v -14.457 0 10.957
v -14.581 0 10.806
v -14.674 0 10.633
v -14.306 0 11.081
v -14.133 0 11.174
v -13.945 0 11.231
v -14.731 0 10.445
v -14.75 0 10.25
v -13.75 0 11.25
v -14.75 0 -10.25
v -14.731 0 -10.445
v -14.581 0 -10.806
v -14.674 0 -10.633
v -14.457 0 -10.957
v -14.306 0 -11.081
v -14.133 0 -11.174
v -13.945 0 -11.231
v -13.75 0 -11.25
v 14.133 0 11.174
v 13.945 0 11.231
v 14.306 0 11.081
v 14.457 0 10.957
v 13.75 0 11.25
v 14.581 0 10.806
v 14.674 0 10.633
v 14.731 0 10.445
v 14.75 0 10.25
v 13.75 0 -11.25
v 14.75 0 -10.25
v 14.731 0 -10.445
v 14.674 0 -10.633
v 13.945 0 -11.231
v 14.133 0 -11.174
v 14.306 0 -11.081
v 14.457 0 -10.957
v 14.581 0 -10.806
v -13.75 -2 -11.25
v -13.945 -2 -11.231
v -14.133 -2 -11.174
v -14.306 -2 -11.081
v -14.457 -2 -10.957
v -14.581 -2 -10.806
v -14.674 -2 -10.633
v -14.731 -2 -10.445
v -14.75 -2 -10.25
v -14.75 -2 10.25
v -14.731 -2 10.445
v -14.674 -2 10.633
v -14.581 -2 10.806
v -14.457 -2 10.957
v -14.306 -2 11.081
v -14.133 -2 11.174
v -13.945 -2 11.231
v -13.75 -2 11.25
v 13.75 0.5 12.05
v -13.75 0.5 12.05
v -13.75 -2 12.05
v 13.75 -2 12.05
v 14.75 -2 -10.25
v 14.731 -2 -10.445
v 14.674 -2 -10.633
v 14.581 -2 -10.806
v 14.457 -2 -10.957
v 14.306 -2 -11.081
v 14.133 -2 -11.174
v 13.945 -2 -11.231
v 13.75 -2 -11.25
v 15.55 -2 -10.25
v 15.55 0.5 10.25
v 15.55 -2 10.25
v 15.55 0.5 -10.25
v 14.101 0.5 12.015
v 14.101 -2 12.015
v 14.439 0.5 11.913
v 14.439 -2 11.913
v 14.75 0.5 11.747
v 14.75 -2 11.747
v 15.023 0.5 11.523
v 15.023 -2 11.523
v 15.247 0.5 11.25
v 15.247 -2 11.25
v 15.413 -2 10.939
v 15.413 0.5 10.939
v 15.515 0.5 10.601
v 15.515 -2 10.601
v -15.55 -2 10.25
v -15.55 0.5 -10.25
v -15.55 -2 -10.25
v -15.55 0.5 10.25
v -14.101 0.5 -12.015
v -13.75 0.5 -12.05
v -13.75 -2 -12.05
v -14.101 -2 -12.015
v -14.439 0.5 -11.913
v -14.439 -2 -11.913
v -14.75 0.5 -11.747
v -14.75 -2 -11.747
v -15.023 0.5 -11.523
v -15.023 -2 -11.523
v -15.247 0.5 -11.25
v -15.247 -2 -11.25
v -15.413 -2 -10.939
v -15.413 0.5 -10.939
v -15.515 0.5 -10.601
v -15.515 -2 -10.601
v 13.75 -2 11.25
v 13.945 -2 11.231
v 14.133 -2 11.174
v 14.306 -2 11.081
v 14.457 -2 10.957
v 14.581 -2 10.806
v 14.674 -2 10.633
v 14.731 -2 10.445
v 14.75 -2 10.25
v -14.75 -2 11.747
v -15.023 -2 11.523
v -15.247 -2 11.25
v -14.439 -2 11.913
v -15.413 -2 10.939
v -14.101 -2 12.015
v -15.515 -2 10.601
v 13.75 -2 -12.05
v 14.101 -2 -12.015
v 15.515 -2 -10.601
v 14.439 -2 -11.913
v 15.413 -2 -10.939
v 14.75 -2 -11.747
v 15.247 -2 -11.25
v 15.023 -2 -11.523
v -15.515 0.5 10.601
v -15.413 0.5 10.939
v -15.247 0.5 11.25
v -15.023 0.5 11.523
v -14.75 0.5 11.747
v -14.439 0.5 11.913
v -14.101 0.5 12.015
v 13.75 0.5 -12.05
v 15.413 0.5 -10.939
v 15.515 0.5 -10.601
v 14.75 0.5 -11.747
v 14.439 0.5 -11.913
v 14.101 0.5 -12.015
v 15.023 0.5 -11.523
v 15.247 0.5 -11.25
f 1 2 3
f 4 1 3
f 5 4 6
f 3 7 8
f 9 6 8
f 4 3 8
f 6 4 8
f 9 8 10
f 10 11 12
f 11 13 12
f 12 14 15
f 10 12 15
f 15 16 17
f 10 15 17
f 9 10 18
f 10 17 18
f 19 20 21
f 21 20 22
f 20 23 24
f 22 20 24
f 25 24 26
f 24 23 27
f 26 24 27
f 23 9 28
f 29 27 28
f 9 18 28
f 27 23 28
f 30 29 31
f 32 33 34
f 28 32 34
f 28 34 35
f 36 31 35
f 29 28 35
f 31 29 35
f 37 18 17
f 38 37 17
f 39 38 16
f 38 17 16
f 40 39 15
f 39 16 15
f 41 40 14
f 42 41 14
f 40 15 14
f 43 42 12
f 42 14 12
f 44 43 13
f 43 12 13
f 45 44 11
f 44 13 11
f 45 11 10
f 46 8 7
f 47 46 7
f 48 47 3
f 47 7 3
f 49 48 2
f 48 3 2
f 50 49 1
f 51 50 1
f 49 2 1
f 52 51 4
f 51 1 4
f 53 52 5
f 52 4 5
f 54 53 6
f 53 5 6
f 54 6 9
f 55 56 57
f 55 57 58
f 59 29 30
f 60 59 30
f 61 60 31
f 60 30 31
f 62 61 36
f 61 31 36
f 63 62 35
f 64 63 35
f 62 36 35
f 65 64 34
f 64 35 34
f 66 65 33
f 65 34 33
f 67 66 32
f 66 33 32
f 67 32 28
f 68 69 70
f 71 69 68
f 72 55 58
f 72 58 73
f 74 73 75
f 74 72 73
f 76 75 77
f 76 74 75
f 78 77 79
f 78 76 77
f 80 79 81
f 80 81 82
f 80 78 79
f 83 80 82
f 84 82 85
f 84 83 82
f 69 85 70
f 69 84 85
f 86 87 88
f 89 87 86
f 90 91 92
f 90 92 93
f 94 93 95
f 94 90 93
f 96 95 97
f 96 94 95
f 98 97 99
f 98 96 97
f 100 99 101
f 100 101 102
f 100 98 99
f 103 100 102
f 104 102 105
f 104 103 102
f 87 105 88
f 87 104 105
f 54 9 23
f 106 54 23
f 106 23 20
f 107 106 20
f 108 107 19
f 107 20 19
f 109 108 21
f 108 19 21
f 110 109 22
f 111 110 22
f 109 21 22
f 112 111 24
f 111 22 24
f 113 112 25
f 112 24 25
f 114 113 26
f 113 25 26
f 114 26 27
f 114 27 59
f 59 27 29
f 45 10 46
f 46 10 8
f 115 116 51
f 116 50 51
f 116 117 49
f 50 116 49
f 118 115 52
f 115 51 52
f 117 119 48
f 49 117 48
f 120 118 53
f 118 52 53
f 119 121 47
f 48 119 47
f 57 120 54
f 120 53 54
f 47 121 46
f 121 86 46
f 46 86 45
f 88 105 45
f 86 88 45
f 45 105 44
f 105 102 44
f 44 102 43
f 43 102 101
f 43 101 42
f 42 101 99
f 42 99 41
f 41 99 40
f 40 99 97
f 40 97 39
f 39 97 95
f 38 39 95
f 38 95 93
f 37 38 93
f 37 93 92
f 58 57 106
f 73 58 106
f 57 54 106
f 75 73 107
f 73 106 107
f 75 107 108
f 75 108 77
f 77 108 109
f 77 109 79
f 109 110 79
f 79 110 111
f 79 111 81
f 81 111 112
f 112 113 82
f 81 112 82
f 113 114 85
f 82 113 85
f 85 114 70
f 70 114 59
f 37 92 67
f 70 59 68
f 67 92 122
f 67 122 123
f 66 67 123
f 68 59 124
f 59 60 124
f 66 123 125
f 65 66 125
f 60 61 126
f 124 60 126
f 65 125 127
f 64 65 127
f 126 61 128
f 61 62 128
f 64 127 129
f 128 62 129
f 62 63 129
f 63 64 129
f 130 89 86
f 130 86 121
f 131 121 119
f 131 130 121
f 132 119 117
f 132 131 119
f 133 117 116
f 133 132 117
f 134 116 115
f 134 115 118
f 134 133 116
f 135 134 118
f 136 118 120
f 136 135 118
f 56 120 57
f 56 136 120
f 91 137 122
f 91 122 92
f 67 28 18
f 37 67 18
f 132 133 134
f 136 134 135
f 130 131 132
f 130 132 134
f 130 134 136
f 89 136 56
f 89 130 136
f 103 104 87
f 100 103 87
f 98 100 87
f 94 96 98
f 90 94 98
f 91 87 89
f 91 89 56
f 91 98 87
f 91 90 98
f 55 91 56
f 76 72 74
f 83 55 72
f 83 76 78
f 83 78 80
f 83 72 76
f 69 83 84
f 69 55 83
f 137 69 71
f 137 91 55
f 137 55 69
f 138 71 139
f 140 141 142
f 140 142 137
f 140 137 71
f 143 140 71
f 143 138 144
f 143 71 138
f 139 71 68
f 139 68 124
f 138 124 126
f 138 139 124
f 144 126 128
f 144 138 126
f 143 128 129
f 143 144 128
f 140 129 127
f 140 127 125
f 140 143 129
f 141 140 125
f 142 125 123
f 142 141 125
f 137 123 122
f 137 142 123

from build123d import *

# Parameters (mm, degrees)
SKETCH_2_W      = 29.5
SKETCH_2_H      = 22.5
LAYER_DEPTH     = 0.5
FILLET_1_R      = 1
EXTRUDE_1_DEPTH = 2.5


with BuildPart() as part:
    # 草图2 → layer (new body)
    with BuildSketch(Plane(origin=(0, 0, 0), x_dir=(1, 0, 0), z_dir=(0, 1, 0))):
        Rectangle(SKETCH_2_W, SKETCH_2_H)
    extrude(amount=LAYER_DEPTH)

    # 圆角1
    fillet_1_edges = [part.edges().sort_by_distance(p)[0] for p in [
        (14.75, 0.25, 11.25),
        (-14.75, 0.25, 11.25),
        (-14.75, 0.25, -11.25),
        (14.75, 0.25, -11.25),
    ]]
    fillet(fillet_1_edges, radius=FILLET_1_R)

    # 草图4 → 凸台-拉伸1 (add)
    with BuildSketch(Plane(origin=(0, 0.5, 0), x_dir=(1, 0, 0), z_dir=(0, 1, 0))):
        with BuildLine():
            Line((-13.75, -12.05), (13.75, -12.05))
            ThreePointArc((13.75, -12.05), (15.022792206, -11.522792206), (15.55, -10.25))
            Line((15.55, -10.25), (15.55, 10.25))
            ThreePointArc((15.55, 10.25), (15.022792206, 11.522792206), (13.75, 12.05))
            Line((13.75, 12.05), (-13.75, 12.05))
            ThreePointArc((-13.75, 12.05), (-15.022792206, 11.522792206), (-15.55, 10.25))
            Line((-15.55, 10.25), (-15.55, -10.25))
            ThreePointArc((-15.55, -10.25), (-15.022792206, -11.522792206), (-13.75, -12.05))
        make_face()
        with BuildLine():
            Line((-13.75, -11.25), (13.75, -11.25))
            ThreePointArc((13.75, -11.25), (14.457106781, -10.957106781), (14.75, -10.25))
            Line((14.75, -10.25), (14.75, 10.25))
            ThreePointArc((14.75, 10.25), (14.457106781, 10.957106781), (13.75, 11.25))
            Line((13.75, 11.25), (-13.75, 11.25))
            ThreePointArc((-13.75, 11.25), (-14.457106781, 10.957106781), (-14.75, 10.25))
            Line((-14.75, 10.25), (-14.75, -10.25))
            ThreePointArc((-14.75, -10.25), (-14.457106781, -10.957106781), (-13.75, -11.25))
        make_face(mode=Mode.SUBTRACT)
    extrude(amount=-EXTRUDE_1_DEPTH)


solid = part.part
